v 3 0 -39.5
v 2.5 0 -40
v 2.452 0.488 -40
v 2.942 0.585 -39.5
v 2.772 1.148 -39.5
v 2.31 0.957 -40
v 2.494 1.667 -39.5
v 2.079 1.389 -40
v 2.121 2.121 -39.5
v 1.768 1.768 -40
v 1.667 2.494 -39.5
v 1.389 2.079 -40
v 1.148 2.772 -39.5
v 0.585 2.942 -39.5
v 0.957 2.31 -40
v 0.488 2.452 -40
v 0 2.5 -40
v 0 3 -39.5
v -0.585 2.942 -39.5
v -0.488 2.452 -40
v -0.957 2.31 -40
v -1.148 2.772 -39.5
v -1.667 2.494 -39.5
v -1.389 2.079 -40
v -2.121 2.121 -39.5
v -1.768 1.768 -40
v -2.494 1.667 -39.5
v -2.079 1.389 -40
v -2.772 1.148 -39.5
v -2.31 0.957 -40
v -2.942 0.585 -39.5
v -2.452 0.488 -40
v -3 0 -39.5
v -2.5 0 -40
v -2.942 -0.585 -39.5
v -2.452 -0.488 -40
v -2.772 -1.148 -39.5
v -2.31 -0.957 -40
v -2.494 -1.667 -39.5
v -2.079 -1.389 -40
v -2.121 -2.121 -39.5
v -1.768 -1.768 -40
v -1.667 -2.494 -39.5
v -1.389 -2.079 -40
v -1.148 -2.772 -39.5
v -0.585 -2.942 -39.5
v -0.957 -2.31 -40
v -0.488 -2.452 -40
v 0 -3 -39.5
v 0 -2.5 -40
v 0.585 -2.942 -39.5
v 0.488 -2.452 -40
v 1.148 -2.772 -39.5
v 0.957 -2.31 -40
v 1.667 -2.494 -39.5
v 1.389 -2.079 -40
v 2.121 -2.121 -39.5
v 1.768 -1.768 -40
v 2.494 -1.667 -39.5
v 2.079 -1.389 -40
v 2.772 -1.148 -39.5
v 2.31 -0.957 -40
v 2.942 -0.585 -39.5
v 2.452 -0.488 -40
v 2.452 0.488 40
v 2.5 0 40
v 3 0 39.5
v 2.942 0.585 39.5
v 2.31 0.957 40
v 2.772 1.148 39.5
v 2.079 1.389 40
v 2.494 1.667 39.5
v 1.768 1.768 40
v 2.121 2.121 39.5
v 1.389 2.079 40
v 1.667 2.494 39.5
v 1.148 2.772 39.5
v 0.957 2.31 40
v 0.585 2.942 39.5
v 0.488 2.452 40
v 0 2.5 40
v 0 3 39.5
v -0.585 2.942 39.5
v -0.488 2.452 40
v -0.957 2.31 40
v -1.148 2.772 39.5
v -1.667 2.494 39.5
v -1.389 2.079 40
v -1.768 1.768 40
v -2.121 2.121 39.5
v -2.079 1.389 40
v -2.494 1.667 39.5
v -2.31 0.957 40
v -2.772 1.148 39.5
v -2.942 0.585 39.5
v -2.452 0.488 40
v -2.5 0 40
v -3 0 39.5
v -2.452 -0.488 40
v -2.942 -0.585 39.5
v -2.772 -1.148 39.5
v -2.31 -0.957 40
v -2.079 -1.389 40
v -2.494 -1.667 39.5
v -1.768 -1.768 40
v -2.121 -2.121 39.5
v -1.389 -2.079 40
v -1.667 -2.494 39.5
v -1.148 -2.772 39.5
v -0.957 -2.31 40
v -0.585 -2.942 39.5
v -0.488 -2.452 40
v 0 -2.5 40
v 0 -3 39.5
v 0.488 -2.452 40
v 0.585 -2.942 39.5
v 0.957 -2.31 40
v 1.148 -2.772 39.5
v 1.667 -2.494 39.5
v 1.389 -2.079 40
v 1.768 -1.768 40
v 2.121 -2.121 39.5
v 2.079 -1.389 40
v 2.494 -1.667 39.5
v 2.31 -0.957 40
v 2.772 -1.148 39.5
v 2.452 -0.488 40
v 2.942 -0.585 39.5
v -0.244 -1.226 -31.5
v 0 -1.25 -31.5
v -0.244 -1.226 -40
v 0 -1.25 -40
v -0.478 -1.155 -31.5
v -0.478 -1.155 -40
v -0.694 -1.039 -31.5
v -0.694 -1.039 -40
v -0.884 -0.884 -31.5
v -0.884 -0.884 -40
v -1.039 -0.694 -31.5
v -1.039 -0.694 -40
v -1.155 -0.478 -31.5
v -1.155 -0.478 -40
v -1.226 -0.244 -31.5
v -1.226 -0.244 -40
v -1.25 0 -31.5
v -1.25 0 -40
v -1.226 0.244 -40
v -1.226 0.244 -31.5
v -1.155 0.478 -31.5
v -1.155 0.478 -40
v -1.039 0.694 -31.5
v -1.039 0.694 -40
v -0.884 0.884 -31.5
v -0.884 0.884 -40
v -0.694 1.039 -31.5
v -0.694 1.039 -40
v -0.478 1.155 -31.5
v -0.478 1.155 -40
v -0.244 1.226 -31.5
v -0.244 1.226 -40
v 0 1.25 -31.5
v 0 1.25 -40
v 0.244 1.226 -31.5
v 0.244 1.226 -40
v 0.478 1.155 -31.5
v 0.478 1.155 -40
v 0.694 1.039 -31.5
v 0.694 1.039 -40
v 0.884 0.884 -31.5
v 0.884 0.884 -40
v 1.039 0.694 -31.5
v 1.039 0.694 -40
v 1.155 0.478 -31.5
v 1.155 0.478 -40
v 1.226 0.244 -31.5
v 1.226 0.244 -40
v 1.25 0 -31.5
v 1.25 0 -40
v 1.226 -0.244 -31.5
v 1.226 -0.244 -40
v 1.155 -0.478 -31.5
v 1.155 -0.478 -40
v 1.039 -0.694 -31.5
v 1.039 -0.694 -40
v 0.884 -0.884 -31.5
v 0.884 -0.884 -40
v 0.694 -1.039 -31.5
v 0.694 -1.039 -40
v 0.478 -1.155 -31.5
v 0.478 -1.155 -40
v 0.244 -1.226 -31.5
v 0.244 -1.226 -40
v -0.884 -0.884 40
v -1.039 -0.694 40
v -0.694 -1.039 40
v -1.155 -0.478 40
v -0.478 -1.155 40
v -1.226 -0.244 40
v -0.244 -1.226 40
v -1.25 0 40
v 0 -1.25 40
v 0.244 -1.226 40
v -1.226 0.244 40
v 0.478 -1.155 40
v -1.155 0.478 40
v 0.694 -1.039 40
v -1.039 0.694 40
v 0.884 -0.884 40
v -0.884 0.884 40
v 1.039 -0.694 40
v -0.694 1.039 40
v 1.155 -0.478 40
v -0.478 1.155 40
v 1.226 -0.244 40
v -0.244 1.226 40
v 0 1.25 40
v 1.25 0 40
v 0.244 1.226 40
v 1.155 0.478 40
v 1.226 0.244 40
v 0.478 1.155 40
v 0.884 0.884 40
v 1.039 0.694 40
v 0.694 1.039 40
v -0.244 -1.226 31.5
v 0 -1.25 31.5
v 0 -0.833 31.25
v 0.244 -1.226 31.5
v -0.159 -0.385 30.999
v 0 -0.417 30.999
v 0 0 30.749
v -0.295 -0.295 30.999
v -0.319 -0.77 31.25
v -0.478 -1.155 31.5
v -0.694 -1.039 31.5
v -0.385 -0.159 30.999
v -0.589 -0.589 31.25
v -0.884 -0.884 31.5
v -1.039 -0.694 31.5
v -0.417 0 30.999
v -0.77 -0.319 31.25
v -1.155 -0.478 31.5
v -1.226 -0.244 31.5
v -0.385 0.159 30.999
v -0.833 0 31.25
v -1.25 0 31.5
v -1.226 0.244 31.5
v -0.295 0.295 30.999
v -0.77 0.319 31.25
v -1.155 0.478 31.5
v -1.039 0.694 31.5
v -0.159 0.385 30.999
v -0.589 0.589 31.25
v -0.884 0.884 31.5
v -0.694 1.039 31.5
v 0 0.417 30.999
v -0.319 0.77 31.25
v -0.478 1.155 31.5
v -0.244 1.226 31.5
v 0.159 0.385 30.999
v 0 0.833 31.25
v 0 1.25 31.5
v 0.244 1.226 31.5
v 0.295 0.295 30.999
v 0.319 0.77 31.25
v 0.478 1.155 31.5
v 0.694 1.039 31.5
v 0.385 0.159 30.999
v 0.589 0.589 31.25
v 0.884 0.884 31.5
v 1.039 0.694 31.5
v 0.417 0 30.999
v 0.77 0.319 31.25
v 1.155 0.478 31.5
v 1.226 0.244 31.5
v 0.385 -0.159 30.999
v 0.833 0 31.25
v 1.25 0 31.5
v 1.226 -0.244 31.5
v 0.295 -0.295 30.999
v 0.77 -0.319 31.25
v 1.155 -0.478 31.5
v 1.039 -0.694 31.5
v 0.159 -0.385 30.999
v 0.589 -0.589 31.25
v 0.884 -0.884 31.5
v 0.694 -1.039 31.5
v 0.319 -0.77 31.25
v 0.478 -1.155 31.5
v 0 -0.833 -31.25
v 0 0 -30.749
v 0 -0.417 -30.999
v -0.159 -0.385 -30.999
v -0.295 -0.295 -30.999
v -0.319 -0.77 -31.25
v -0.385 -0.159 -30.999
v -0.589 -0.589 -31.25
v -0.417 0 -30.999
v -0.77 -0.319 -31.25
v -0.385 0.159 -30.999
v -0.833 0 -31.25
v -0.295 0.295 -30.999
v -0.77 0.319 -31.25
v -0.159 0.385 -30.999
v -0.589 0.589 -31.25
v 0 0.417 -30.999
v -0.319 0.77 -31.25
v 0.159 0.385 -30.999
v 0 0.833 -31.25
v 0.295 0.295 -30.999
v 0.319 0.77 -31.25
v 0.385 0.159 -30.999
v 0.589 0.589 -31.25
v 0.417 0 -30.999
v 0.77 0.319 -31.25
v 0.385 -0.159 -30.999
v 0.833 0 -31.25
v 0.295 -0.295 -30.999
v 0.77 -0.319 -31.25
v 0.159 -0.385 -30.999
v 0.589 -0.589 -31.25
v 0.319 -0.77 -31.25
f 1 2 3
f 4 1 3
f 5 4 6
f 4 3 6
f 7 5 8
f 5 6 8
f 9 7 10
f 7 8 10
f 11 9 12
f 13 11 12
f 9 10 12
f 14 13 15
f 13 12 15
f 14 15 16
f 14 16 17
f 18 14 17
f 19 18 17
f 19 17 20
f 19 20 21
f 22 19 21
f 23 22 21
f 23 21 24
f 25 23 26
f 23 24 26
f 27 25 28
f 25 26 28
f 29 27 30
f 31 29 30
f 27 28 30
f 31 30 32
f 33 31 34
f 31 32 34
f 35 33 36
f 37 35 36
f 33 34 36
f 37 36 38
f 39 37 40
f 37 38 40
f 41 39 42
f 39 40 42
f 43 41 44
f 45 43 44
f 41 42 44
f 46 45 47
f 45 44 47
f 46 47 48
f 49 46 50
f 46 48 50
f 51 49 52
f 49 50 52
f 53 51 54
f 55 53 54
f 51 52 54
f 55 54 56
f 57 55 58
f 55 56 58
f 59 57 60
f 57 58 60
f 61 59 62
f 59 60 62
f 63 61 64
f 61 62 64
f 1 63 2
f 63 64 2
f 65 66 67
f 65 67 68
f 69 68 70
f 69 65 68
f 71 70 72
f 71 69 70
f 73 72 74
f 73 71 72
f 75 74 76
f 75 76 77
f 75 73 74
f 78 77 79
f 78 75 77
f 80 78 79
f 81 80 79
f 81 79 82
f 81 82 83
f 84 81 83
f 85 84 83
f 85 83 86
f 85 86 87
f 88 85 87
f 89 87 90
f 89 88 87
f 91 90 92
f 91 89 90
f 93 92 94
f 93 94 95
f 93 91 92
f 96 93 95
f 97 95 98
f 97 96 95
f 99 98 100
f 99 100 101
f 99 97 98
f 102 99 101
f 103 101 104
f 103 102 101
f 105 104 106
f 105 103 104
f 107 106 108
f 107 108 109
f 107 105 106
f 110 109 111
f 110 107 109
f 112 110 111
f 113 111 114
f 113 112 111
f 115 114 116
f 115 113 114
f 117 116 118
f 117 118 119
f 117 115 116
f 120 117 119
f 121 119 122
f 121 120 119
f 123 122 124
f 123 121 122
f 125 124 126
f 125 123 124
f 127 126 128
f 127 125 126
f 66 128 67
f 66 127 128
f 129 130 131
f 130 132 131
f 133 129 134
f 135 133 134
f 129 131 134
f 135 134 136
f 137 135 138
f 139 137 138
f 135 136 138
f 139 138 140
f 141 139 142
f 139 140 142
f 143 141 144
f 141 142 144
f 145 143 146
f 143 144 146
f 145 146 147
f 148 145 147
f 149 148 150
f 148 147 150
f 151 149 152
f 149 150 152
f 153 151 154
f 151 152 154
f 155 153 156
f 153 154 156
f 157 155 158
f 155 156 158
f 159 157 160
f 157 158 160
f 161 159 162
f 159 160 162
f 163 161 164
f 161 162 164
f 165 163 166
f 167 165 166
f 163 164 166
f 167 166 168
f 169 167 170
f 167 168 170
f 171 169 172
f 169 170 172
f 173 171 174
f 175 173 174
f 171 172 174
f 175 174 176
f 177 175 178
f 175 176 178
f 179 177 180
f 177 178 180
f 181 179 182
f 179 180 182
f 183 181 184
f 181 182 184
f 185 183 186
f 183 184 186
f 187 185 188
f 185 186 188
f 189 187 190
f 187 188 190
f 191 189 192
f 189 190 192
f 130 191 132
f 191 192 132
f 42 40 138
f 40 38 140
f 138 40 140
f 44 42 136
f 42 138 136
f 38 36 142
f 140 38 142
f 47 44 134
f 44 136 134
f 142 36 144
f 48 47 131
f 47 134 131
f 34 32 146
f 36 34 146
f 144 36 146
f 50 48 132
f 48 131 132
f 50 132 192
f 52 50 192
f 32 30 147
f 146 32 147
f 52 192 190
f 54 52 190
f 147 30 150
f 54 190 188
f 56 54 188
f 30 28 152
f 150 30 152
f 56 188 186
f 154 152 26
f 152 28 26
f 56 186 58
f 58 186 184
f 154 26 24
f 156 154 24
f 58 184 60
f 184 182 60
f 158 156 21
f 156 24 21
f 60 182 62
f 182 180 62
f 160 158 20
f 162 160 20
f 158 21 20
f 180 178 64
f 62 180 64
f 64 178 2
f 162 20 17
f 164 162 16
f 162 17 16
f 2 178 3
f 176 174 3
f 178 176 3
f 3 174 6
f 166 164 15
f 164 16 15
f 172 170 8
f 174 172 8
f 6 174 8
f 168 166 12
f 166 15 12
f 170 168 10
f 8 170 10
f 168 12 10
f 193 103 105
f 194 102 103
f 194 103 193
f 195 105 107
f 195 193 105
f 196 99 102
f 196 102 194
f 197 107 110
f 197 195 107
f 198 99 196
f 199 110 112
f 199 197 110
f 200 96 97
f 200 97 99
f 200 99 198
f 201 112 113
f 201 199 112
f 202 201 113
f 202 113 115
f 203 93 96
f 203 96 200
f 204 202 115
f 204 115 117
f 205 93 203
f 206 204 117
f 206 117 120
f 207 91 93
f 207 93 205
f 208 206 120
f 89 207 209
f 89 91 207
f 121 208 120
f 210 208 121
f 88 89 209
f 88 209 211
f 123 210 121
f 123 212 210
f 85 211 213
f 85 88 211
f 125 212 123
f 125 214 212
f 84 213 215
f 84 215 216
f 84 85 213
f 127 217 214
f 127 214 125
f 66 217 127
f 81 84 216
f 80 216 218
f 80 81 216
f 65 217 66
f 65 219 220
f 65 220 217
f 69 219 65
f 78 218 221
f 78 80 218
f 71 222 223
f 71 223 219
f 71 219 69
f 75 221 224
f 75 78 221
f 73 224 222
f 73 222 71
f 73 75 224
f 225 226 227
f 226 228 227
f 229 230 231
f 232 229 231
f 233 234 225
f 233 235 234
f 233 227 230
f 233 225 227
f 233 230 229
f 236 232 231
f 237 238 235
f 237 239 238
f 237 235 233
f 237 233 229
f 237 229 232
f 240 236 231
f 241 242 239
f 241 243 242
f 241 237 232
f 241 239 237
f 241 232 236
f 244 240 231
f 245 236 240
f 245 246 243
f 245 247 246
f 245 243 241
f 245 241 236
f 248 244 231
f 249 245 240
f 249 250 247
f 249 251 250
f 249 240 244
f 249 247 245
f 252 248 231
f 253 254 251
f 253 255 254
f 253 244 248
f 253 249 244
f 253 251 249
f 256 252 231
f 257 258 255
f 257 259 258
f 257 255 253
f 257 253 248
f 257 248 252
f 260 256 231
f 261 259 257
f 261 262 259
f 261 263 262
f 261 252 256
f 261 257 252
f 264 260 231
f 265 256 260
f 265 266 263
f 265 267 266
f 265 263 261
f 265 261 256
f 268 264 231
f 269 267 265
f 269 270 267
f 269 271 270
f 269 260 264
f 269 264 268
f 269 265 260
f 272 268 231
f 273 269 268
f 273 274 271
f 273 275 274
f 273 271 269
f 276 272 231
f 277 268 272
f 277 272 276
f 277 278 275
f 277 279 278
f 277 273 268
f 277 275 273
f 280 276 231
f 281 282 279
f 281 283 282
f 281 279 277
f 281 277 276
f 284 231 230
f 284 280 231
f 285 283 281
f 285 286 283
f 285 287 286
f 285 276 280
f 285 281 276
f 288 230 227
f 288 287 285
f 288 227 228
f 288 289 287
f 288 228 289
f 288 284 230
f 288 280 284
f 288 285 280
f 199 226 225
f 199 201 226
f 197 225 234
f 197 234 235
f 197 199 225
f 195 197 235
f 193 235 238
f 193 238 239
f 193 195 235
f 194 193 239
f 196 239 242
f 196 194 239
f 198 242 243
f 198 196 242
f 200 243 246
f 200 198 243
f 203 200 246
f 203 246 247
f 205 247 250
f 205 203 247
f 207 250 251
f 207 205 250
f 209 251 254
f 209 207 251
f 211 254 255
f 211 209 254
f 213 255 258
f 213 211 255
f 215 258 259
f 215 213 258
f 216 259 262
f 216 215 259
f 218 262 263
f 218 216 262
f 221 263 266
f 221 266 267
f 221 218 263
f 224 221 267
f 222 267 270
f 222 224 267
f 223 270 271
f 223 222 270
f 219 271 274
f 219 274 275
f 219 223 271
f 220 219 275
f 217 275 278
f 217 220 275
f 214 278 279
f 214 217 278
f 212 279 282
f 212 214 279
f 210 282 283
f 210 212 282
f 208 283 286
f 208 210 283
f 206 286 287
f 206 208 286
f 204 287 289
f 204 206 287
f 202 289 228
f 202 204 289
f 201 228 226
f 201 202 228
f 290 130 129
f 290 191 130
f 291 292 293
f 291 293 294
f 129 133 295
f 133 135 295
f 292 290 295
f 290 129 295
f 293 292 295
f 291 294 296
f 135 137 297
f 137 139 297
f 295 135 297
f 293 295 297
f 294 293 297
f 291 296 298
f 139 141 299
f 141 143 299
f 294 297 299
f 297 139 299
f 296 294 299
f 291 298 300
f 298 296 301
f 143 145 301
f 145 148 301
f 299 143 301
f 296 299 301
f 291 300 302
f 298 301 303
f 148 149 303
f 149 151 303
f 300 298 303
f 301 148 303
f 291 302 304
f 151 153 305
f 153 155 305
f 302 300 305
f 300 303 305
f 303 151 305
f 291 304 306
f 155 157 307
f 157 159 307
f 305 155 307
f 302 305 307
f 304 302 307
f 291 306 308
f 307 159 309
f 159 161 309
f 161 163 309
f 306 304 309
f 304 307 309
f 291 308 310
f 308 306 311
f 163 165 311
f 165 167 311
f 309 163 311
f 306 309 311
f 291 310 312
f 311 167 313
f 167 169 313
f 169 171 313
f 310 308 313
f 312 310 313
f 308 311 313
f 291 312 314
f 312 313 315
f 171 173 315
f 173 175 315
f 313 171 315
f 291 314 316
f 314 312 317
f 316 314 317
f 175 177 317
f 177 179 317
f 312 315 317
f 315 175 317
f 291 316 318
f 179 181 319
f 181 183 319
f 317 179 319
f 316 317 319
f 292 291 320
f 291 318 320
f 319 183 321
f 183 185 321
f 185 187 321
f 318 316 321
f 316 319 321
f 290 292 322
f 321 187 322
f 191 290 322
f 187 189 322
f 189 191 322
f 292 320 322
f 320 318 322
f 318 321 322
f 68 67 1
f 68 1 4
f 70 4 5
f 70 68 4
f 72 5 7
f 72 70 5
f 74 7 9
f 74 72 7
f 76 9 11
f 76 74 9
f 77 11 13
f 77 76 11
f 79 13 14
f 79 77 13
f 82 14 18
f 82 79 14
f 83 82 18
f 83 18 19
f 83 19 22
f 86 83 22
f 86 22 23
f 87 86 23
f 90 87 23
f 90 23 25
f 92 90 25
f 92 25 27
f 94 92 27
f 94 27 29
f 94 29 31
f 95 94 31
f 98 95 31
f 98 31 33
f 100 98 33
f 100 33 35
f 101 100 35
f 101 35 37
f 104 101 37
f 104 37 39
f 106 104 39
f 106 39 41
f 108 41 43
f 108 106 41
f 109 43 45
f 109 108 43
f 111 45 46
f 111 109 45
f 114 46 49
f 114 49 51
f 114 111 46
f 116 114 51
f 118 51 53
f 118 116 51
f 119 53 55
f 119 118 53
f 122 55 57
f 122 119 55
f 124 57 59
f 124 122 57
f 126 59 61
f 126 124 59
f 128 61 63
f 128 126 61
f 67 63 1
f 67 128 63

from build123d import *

# Parameters (mm, degrees)
SKETCH_1_R      = 3
EXTRUDE_1_DEPTH = 40
CHAMFER_1_SIZE  = 0.5


with BuildPart() as part:
    # ｽｹｯﾁ1 → ﾎﾞｽ - 押し出し1 (new, symmetric)
    with BuildSketch(Plane.XY):
        Circle(SKETCH_1_R)
    extrude(amount=EXTRUDE_1_DEPTH, both=True)

    # 面取り1
    chamfer_1_edges = [part.edges().sort_by_distance(p)[0] for p in [
        (-3, 0, -40),
        (-3, 0, 40),
    ]]
    chamfer(chamfer_1_edges, length=CHAMFER_1_SIZE)

    # ｽｹｯﾁ3 → M3 ねじ穴1 (revolve, cut)
    with BuildSketch(Plane(origin=(0, 0, 40), x_dir=(0, -1, 0), z_dir=(1, 0, 0))):
        Polygon((0, 0), (0, 9.251075774), (1.25, 8.5), (1.25, 0), align=None)
    hole_wizard_m3_1 = revolve(axis=Axis((0, 0, 46.35), (0, 0, -1)), mode=Mode.SUBTRACT)

    # ﾐﾗｰ1: M3 ねじ穴1 across plane
    add(hole_wizard_m3_1.mirror(Plane.XY), mode=Mode.SUBTRACT)


solid = part.part
